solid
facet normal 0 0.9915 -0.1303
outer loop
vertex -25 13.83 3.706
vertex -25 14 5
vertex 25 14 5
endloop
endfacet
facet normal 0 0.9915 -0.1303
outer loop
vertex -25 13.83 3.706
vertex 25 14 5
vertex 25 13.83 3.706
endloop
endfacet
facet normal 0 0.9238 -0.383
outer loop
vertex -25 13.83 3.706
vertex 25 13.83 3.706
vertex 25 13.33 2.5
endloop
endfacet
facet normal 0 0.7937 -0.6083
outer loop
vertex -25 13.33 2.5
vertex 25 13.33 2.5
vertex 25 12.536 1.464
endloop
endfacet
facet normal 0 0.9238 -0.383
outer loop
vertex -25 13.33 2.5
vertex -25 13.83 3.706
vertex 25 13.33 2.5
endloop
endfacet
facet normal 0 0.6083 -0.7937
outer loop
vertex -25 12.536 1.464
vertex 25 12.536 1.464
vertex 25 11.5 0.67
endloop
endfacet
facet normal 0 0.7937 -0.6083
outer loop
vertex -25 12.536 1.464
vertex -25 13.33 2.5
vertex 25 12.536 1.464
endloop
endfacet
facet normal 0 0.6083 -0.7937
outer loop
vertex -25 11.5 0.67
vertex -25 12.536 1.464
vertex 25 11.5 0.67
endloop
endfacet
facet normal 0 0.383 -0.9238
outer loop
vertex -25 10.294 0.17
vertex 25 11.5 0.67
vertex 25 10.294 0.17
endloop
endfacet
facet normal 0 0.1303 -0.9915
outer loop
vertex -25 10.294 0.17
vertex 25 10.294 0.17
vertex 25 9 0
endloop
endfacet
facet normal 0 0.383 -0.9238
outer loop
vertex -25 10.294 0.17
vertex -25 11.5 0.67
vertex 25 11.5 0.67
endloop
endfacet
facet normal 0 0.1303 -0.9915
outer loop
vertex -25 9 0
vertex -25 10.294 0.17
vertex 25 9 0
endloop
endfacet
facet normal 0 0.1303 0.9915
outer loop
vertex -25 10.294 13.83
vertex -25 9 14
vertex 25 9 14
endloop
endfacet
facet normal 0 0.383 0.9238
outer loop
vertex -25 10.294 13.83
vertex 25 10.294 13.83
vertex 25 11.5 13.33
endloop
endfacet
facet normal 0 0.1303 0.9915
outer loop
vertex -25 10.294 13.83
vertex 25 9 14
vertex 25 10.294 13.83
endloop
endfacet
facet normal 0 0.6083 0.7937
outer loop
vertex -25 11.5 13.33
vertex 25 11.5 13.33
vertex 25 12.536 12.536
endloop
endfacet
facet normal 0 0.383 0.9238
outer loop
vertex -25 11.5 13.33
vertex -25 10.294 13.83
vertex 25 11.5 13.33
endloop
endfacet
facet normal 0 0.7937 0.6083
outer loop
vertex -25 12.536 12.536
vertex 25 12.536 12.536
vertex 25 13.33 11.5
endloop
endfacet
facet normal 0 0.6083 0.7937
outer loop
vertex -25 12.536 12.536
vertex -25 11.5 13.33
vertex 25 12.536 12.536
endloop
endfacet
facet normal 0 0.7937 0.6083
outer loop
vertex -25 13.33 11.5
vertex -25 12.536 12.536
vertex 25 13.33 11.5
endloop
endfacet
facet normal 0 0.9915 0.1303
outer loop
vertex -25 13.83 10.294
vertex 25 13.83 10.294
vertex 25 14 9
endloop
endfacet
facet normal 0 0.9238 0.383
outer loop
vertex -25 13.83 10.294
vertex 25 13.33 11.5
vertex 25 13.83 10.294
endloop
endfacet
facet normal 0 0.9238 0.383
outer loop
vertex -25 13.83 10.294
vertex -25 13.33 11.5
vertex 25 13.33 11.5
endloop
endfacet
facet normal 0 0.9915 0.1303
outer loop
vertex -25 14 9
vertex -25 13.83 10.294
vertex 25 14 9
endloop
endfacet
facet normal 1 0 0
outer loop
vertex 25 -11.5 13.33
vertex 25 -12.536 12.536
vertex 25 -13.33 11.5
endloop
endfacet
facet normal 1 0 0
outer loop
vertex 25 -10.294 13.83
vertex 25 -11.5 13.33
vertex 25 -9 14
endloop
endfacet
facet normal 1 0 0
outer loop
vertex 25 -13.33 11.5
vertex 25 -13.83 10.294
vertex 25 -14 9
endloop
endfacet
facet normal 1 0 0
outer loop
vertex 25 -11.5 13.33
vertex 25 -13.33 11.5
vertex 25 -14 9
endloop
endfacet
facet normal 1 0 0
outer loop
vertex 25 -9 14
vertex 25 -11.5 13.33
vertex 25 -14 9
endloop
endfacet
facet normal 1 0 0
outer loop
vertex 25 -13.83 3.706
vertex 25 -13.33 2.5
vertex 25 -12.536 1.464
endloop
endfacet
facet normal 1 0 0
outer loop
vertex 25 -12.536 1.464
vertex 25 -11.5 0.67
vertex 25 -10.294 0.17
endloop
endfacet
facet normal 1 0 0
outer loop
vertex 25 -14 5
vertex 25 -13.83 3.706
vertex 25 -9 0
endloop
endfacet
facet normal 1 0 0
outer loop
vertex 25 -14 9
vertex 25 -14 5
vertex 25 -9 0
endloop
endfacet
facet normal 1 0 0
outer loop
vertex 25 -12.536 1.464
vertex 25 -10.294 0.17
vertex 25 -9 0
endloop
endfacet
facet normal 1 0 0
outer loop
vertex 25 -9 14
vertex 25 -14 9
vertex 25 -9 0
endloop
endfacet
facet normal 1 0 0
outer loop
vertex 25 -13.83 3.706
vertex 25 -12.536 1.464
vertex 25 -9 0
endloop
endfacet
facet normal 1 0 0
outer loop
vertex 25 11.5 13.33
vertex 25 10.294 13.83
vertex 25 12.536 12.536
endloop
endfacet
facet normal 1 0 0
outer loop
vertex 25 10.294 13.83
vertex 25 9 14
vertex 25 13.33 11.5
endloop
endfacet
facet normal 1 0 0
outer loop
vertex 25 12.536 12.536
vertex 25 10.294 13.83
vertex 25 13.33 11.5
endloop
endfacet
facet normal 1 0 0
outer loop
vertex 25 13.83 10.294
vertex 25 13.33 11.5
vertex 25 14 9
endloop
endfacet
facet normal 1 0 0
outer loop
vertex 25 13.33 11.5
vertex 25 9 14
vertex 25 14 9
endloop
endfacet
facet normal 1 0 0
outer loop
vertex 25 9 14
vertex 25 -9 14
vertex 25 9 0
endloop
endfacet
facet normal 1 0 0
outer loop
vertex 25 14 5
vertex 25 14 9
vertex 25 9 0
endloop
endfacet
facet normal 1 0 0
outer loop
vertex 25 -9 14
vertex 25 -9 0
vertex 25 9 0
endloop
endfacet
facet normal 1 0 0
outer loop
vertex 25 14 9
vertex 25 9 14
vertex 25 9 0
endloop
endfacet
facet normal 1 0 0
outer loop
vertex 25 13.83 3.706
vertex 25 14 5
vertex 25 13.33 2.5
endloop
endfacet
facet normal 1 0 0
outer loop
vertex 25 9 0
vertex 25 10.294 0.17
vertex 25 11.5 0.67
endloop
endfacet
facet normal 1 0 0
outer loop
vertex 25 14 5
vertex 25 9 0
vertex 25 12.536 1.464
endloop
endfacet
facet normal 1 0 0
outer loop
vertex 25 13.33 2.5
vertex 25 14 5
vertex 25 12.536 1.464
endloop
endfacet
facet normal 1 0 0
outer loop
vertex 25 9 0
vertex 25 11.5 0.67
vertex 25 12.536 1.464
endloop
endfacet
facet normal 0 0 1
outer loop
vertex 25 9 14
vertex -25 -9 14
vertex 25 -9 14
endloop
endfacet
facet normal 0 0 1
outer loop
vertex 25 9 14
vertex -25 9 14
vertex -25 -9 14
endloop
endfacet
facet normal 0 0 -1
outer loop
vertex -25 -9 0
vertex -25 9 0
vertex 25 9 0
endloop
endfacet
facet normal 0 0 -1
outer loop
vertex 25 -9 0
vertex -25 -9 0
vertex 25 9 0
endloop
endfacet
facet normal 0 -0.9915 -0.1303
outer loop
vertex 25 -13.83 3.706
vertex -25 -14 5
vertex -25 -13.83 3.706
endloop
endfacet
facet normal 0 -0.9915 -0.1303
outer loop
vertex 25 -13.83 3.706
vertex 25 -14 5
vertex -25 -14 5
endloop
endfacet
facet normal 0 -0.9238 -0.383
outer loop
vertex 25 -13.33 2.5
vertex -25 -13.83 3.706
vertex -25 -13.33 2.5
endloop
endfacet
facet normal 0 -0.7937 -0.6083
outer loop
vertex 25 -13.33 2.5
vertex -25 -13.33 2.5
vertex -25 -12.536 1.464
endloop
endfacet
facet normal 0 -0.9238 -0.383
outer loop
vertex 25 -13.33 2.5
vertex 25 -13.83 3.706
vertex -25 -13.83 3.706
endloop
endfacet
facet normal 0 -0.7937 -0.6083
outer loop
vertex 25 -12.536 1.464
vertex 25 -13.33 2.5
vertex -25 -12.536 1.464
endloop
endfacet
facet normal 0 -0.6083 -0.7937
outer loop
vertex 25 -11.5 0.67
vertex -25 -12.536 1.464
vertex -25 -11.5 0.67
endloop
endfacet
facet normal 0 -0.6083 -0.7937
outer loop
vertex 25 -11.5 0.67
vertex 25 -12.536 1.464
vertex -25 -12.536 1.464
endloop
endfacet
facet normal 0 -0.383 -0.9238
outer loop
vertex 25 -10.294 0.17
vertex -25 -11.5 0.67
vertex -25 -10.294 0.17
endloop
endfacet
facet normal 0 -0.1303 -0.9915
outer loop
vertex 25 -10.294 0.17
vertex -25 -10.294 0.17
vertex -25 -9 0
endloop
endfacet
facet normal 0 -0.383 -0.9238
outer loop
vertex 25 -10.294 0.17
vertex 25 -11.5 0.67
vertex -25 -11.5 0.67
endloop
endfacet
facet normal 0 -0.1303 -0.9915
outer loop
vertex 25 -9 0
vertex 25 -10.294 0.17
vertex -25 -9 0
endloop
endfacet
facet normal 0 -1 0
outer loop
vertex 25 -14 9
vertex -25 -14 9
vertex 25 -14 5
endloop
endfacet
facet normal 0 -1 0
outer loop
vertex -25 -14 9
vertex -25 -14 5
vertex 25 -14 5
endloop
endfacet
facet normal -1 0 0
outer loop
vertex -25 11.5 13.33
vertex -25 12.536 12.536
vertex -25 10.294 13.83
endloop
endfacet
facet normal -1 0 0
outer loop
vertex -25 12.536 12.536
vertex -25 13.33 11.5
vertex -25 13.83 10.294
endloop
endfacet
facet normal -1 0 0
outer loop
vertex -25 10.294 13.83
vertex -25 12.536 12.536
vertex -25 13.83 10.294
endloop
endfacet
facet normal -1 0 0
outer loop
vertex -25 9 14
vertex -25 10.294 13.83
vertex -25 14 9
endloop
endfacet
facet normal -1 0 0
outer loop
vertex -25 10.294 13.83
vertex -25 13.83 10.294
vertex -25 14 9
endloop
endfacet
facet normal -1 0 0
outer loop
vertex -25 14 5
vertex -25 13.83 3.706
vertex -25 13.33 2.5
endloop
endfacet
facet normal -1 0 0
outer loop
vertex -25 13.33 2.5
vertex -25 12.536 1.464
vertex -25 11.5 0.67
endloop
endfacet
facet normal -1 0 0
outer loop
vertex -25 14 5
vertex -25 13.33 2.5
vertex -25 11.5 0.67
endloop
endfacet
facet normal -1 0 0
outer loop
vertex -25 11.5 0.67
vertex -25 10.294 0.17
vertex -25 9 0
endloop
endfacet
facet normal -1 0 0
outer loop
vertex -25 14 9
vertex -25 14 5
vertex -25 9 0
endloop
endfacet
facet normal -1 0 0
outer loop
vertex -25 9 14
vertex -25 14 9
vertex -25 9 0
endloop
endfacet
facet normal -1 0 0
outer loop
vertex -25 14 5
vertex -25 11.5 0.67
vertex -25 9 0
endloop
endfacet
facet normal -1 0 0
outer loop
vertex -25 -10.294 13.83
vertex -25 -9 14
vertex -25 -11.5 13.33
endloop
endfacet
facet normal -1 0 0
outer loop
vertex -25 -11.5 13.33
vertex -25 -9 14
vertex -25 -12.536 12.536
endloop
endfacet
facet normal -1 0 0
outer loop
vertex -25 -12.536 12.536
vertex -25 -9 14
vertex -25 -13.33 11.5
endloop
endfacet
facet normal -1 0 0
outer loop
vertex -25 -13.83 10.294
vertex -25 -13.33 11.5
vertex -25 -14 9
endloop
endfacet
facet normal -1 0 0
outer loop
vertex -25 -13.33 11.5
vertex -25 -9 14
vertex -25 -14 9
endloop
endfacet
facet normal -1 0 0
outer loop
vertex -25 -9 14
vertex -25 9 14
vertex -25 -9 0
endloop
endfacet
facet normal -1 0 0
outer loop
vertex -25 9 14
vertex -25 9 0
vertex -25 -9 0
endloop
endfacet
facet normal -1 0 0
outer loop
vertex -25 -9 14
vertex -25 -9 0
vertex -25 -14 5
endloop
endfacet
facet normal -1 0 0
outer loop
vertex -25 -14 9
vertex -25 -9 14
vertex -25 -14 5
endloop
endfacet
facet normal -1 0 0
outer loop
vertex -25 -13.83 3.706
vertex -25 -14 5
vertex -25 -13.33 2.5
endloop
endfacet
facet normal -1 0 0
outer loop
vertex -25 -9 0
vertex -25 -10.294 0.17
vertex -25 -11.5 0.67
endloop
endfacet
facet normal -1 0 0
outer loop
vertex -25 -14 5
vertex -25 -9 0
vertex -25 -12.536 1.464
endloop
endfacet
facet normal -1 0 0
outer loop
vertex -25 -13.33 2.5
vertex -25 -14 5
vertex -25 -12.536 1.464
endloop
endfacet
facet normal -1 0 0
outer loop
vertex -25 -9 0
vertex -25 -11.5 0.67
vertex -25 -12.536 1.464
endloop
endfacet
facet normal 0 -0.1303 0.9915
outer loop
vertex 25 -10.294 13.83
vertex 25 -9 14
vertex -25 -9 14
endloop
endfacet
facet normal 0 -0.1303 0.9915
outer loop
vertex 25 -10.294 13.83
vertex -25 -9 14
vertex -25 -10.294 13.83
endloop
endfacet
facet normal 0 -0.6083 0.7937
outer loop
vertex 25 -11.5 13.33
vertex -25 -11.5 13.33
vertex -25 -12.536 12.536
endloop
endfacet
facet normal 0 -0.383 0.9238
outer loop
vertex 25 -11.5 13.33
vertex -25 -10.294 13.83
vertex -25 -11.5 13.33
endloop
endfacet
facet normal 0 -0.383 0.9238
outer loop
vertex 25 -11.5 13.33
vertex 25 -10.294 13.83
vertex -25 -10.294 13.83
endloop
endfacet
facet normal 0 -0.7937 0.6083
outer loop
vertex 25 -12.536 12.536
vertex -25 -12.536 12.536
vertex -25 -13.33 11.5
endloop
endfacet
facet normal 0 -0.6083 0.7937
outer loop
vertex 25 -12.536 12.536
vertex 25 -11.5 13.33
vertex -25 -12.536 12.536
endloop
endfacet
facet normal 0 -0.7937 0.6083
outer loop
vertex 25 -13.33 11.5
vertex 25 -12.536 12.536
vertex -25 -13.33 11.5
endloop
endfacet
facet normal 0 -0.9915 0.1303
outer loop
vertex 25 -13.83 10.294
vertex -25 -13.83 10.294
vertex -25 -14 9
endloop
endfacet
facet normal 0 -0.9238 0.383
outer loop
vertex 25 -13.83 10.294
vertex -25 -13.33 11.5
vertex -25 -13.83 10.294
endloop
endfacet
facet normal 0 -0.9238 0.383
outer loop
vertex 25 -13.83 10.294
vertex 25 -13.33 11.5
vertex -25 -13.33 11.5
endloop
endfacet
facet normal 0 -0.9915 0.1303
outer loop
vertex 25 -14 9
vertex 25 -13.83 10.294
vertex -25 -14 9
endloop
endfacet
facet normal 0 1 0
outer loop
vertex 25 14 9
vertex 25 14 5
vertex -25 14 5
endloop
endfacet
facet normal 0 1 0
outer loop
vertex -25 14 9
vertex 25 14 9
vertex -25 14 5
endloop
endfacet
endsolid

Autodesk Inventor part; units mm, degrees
ref_plane "YZ Plane" through (0, 0, 0) normal (1, 0, 0) x (0, 1, 0)
ref_plane "XZ Plane" through (0, 0, 0) normal (0, 1, 0) x (-1, 0, 0)
ref_plane "XY Plane" through (0, 0, 0) normal (0, 0, 1) x (1, 0, 0)
sketch "Náčrt1" plane through (0, 0, 0) normal (0, 0, 1) x (1, 0, 0)
  line L0 (0, 0) -> (-25, 0) construction
  line L1 (-25, 0) -> (-25, -14) construction
  line L2 (-25, -14) -> (0, -14) construction
  line L3 (0, -14) -> (0, 0) construction
  line L4 (-25, -14) -> (25, -14)
  line L5 (25, -14) -> (25, 14)
  line L6 (25, 14) -> (-25, 14)
  line L7 (-25, 14) -> (-25, -14)
  dimension "d0" = 25
  dimension "d1" = 14
  dimension "d2" = 50
  dimension "d3" = 28
extrude "Vysunutí1" add sketch "Náčrt1" along normal blind 14
fillet "Zaoblení1" radius 5 4 edges at (0, 14, 14) (0, 14, 0) (0, -14, 14) (0, -14, 0)
properties part number "7.4 V  500MaH Li pol"
